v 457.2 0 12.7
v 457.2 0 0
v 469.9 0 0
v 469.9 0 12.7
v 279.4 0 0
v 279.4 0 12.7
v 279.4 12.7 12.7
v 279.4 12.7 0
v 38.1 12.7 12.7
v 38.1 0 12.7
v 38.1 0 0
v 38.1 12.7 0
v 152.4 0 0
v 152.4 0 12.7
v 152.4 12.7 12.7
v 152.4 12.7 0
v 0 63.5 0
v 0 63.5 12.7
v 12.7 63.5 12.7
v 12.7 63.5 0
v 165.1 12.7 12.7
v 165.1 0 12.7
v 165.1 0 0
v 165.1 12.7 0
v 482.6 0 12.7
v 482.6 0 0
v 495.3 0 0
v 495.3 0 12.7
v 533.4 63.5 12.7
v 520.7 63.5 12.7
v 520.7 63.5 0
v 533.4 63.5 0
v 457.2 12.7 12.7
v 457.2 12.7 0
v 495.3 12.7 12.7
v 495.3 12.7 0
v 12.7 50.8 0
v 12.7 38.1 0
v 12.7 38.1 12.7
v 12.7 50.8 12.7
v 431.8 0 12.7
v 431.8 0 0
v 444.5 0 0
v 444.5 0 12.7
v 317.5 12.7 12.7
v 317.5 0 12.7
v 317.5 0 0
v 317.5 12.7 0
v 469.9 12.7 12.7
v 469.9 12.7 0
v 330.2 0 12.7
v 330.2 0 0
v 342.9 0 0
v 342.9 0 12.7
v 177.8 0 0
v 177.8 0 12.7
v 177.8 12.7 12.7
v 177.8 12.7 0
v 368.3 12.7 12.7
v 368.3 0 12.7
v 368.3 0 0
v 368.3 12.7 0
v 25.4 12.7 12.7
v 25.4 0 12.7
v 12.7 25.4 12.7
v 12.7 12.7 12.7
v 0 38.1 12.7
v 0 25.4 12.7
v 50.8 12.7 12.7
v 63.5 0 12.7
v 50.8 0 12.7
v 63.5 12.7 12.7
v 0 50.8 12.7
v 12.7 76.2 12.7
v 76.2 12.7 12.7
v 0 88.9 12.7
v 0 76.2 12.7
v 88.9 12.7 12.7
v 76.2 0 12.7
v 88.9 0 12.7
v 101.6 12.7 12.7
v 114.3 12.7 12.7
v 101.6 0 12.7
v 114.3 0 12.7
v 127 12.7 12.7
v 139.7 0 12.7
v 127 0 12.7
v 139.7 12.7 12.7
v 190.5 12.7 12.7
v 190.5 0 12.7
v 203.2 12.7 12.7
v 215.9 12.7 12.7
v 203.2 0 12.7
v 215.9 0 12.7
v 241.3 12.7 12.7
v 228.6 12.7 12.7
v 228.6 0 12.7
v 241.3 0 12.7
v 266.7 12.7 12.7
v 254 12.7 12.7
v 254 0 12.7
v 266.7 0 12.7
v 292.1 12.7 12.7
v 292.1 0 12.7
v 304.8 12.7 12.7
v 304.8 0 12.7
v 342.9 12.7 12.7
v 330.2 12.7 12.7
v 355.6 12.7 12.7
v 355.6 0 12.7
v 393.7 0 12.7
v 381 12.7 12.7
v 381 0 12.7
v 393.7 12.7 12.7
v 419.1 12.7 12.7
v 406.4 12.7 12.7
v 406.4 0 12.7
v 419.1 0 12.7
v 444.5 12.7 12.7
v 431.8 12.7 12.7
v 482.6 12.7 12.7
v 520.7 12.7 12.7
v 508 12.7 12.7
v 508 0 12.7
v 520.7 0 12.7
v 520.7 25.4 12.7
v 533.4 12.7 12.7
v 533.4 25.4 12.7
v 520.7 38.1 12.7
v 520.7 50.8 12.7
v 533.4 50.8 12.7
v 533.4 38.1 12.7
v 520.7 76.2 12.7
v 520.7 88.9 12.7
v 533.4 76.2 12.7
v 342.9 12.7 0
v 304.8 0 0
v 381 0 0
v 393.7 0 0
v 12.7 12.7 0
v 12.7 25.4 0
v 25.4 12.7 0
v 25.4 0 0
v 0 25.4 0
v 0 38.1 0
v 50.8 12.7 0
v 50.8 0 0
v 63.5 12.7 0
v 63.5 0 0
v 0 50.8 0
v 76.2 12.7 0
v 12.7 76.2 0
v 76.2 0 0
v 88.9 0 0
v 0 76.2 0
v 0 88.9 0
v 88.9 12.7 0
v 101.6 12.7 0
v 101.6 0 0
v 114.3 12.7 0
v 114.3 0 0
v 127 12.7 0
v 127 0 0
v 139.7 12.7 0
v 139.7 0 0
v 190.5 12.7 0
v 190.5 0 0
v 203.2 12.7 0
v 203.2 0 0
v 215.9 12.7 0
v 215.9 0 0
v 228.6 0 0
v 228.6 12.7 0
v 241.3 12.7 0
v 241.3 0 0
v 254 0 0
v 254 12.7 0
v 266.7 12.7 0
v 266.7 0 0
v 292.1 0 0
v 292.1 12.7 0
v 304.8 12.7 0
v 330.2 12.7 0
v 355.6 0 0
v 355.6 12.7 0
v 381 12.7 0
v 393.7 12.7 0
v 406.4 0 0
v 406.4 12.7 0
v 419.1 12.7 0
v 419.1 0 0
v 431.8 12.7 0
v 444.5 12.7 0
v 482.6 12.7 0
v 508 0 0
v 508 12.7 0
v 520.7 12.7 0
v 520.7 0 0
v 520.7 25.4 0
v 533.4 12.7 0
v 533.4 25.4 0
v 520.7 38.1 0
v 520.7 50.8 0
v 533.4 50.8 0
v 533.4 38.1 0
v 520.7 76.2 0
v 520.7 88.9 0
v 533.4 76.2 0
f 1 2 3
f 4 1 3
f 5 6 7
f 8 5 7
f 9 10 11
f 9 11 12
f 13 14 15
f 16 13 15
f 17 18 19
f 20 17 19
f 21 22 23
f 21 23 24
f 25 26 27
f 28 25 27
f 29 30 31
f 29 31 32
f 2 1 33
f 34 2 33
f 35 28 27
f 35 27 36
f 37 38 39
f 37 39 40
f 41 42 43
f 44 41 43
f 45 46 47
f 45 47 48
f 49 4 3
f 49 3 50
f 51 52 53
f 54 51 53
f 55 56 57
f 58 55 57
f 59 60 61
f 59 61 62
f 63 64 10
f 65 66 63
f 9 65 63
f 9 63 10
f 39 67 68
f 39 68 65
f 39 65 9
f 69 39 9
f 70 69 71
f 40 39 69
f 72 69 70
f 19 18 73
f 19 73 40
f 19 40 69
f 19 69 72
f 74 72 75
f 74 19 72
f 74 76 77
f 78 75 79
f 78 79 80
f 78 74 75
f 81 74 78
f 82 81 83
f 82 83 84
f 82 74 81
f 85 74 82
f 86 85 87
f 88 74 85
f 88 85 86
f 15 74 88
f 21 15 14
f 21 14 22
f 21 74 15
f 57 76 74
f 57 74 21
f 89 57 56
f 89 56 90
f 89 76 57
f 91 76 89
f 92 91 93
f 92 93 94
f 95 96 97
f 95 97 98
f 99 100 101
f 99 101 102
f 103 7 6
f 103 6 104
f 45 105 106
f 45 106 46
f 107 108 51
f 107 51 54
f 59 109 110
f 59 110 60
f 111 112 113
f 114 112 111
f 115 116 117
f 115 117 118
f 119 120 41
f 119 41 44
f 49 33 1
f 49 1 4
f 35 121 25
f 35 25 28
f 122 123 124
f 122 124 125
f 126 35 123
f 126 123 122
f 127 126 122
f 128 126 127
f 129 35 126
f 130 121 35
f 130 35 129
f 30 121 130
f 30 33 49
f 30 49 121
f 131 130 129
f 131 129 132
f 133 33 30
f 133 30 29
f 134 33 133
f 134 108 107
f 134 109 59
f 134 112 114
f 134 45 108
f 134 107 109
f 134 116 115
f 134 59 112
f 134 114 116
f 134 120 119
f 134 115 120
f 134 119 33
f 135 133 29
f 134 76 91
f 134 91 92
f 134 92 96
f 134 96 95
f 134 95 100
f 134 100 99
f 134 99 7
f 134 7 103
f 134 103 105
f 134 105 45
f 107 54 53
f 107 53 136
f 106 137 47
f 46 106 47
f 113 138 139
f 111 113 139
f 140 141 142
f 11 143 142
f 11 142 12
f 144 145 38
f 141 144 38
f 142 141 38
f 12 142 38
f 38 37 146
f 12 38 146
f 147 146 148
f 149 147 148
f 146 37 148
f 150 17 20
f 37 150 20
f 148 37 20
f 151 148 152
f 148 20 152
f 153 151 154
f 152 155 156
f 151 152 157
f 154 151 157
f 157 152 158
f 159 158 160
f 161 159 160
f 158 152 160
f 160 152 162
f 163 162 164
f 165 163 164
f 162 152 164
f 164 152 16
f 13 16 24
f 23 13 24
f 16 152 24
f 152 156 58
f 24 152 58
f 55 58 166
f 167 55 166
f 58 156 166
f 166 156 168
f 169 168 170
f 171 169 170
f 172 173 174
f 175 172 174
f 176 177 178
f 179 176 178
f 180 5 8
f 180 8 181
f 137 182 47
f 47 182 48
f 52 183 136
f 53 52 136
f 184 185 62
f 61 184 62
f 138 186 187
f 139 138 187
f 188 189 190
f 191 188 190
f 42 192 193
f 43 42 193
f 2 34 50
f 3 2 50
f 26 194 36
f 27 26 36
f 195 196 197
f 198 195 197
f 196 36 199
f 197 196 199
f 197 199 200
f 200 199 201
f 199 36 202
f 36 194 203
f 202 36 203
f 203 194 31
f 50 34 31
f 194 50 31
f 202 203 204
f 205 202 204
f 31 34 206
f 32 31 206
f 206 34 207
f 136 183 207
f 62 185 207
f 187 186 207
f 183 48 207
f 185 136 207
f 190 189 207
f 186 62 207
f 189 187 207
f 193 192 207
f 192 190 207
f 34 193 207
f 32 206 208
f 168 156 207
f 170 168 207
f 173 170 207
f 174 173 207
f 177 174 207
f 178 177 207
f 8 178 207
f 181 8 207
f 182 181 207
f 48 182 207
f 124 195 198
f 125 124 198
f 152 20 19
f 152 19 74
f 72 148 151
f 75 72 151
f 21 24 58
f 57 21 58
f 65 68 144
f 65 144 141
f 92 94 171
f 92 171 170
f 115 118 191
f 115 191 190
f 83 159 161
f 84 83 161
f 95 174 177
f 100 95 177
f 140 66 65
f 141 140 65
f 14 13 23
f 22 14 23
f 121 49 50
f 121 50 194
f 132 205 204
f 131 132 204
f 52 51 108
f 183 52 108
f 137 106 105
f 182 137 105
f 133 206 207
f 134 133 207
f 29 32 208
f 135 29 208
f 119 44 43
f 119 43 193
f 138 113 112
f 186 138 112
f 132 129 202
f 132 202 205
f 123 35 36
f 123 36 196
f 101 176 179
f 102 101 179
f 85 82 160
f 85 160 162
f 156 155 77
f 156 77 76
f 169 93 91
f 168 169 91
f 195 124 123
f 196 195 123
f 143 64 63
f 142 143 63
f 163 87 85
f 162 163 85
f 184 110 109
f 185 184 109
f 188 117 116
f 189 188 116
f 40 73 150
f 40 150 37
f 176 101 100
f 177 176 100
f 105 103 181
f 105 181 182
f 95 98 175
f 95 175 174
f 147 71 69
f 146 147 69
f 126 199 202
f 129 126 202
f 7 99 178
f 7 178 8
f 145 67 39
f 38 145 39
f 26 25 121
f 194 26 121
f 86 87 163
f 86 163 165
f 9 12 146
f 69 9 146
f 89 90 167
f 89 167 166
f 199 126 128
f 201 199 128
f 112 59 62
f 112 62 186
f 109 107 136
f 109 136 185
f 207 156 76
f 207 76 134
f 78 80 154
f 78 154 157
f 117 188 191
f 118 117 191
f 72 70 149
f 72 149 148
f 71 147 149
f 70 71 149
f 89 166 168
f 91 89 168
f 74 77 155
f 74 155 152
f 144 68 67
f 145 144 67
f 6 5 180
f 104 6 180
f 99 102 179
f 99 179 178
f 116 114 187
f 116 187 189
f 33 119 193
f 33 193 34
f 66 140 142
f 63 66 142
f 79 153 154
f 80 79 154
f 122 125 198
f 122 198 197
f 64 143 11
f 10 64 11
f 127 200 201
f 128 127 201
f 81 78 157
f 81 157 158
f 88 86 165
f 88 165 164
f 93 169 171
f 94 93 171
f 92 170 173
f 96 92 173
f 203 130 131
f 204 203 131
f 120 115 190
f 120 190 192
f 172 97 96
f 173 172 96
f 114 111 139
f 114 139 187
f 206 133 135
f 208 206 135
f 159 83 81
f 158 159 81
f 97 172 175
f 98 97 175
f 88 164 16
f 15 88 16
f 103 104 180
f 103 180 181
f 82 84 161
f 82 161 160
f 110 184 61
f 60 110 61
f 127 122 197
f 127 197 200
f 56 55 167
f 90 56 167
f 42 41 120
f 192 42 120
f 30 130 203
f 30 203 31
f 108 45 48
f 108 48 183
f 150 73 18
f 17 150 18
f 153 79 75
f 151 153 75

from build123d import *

# Parameters (mm, degrees)
F0_W     = 533.4
F0_H     = 88.9
F1_DEPTH = 12.7
F2_W     = 12.7
F2_H     = 12.7
F3_DEPTH = 25.4
F4_W     = 12.7
F4_H     = 12.7
F4_H_2   = 25.4
F5_DEPTH = 25.4
F6_W     = 12.7
F6_H     = 12.7
F7_DEPTH = 25.4


with BuildPart() as f1:
    # F0 (on Top) → F1 (new body)
    with BuildSketch(Plane.XY):
        with Locations((266.7, 44.45)):
            Rectangle(F0_W, F0_H)
    extrude(amount=F1_DEPTH)

    # F2 (on face) → F3 (cut)
    with BuildSketch(Plane.XY.offset(12.7)):
        with Locations((527.05, 6.35)):
            Rectangle(F2_W, F2_H)
        with Locations((527.05, 31.75)):
            Rectangle(F2_W, F2_H)
        with Locations((527.05, 57.15)):
            Rectangle(F2_W, F2_H)
        with Locations((527.05, 82.55)):
            Rectangle(F2_W, F2_H)
    extrude(amount=-F3_DEPTH, mode=Mode.SUBTRACT)

    # F4 (on face) → F5 (cut)
    with BuildSketch(Plane.XY.offset(12.7)):
        with Locations((6.35, 44.45)):
            Rectangle(F4_W, F4_H)
        with Locations((6.35, 69.85)):
            Rectangle(F4_W, F4_H)
        with Locations((6.35, 12.7)):
            Rectangle(F4_W, F4_H_2)
    extrude(amount=-F5_DEPTH, mode=Mode.SUBTRACT)

    # F6 (on face) → F7 (cut)
    with BuildSketch(Plane.XY.offset(12.7)):
        with Locations((19.05, 6.35)):
            Rectangle(F6_W, F6_H)
        with Locations((44.45, 6.35)):
            Rectangle(F6_W, F6_H)
        with Locations((69.85, 6.35)):
            Rectangle(F6_W, F6_H)
        with Locations((95.25, 6.35)):
            Rectangle(F6_W, F6_H)
        with Locations((120.65, 6.35)):
            Rectangle(F6_W, F6_H)
        with Locations((146.05, 6.35)):
            Rectangle(F6_W, F6_H)
        with Locations((171.45, 6.35)):
            Rectangle(F6_W, F6_H)
        with Locations((196.85, 6.35)):
            Rectangle(F6_W, F6_H)
        with Locations((222.25, 6.35)):
            Rectangle(F6_W, F6_H)
        with Locations((247.65, 6.35)):
            Rectangle(F6_W, F6_H)
        with Locations((273.05, 6.35)):
            Rectangle(F6_W, F6_H)
        with Locations((298.45, 6.35)):
            Rectangle(F6_W, F6_H)
        with Locations((323.85, 6.35)):
            Rectangle(F6_W, F6_H)
        with Locations((349.25, 6.35)):
            Rectangle(F6_W, F6_H)
        with Locations((374.65, 6.35)):
            Rectangle(F6_W, F6_H)
        with Locations((400.05, 6.35)):
            Rectangle(F6_W, F6_H)
        with Locations((425.45, 6.35)):
            Rectangle(F6_W, F6_H)
        with Locations((450.85, 6.35)):
            Rectangle(F6_W, F6_H)
        with Locations((476.25, 6.35)):
            Rectangle(F6_W, F6_H)
        with Locations((501.65, 6.35)):
            Rectangle(F6_W, F6_H)
    extrude(amount=-F7_DEPTH, mode=Mode.SUBTRACT)


solid = f1.part
